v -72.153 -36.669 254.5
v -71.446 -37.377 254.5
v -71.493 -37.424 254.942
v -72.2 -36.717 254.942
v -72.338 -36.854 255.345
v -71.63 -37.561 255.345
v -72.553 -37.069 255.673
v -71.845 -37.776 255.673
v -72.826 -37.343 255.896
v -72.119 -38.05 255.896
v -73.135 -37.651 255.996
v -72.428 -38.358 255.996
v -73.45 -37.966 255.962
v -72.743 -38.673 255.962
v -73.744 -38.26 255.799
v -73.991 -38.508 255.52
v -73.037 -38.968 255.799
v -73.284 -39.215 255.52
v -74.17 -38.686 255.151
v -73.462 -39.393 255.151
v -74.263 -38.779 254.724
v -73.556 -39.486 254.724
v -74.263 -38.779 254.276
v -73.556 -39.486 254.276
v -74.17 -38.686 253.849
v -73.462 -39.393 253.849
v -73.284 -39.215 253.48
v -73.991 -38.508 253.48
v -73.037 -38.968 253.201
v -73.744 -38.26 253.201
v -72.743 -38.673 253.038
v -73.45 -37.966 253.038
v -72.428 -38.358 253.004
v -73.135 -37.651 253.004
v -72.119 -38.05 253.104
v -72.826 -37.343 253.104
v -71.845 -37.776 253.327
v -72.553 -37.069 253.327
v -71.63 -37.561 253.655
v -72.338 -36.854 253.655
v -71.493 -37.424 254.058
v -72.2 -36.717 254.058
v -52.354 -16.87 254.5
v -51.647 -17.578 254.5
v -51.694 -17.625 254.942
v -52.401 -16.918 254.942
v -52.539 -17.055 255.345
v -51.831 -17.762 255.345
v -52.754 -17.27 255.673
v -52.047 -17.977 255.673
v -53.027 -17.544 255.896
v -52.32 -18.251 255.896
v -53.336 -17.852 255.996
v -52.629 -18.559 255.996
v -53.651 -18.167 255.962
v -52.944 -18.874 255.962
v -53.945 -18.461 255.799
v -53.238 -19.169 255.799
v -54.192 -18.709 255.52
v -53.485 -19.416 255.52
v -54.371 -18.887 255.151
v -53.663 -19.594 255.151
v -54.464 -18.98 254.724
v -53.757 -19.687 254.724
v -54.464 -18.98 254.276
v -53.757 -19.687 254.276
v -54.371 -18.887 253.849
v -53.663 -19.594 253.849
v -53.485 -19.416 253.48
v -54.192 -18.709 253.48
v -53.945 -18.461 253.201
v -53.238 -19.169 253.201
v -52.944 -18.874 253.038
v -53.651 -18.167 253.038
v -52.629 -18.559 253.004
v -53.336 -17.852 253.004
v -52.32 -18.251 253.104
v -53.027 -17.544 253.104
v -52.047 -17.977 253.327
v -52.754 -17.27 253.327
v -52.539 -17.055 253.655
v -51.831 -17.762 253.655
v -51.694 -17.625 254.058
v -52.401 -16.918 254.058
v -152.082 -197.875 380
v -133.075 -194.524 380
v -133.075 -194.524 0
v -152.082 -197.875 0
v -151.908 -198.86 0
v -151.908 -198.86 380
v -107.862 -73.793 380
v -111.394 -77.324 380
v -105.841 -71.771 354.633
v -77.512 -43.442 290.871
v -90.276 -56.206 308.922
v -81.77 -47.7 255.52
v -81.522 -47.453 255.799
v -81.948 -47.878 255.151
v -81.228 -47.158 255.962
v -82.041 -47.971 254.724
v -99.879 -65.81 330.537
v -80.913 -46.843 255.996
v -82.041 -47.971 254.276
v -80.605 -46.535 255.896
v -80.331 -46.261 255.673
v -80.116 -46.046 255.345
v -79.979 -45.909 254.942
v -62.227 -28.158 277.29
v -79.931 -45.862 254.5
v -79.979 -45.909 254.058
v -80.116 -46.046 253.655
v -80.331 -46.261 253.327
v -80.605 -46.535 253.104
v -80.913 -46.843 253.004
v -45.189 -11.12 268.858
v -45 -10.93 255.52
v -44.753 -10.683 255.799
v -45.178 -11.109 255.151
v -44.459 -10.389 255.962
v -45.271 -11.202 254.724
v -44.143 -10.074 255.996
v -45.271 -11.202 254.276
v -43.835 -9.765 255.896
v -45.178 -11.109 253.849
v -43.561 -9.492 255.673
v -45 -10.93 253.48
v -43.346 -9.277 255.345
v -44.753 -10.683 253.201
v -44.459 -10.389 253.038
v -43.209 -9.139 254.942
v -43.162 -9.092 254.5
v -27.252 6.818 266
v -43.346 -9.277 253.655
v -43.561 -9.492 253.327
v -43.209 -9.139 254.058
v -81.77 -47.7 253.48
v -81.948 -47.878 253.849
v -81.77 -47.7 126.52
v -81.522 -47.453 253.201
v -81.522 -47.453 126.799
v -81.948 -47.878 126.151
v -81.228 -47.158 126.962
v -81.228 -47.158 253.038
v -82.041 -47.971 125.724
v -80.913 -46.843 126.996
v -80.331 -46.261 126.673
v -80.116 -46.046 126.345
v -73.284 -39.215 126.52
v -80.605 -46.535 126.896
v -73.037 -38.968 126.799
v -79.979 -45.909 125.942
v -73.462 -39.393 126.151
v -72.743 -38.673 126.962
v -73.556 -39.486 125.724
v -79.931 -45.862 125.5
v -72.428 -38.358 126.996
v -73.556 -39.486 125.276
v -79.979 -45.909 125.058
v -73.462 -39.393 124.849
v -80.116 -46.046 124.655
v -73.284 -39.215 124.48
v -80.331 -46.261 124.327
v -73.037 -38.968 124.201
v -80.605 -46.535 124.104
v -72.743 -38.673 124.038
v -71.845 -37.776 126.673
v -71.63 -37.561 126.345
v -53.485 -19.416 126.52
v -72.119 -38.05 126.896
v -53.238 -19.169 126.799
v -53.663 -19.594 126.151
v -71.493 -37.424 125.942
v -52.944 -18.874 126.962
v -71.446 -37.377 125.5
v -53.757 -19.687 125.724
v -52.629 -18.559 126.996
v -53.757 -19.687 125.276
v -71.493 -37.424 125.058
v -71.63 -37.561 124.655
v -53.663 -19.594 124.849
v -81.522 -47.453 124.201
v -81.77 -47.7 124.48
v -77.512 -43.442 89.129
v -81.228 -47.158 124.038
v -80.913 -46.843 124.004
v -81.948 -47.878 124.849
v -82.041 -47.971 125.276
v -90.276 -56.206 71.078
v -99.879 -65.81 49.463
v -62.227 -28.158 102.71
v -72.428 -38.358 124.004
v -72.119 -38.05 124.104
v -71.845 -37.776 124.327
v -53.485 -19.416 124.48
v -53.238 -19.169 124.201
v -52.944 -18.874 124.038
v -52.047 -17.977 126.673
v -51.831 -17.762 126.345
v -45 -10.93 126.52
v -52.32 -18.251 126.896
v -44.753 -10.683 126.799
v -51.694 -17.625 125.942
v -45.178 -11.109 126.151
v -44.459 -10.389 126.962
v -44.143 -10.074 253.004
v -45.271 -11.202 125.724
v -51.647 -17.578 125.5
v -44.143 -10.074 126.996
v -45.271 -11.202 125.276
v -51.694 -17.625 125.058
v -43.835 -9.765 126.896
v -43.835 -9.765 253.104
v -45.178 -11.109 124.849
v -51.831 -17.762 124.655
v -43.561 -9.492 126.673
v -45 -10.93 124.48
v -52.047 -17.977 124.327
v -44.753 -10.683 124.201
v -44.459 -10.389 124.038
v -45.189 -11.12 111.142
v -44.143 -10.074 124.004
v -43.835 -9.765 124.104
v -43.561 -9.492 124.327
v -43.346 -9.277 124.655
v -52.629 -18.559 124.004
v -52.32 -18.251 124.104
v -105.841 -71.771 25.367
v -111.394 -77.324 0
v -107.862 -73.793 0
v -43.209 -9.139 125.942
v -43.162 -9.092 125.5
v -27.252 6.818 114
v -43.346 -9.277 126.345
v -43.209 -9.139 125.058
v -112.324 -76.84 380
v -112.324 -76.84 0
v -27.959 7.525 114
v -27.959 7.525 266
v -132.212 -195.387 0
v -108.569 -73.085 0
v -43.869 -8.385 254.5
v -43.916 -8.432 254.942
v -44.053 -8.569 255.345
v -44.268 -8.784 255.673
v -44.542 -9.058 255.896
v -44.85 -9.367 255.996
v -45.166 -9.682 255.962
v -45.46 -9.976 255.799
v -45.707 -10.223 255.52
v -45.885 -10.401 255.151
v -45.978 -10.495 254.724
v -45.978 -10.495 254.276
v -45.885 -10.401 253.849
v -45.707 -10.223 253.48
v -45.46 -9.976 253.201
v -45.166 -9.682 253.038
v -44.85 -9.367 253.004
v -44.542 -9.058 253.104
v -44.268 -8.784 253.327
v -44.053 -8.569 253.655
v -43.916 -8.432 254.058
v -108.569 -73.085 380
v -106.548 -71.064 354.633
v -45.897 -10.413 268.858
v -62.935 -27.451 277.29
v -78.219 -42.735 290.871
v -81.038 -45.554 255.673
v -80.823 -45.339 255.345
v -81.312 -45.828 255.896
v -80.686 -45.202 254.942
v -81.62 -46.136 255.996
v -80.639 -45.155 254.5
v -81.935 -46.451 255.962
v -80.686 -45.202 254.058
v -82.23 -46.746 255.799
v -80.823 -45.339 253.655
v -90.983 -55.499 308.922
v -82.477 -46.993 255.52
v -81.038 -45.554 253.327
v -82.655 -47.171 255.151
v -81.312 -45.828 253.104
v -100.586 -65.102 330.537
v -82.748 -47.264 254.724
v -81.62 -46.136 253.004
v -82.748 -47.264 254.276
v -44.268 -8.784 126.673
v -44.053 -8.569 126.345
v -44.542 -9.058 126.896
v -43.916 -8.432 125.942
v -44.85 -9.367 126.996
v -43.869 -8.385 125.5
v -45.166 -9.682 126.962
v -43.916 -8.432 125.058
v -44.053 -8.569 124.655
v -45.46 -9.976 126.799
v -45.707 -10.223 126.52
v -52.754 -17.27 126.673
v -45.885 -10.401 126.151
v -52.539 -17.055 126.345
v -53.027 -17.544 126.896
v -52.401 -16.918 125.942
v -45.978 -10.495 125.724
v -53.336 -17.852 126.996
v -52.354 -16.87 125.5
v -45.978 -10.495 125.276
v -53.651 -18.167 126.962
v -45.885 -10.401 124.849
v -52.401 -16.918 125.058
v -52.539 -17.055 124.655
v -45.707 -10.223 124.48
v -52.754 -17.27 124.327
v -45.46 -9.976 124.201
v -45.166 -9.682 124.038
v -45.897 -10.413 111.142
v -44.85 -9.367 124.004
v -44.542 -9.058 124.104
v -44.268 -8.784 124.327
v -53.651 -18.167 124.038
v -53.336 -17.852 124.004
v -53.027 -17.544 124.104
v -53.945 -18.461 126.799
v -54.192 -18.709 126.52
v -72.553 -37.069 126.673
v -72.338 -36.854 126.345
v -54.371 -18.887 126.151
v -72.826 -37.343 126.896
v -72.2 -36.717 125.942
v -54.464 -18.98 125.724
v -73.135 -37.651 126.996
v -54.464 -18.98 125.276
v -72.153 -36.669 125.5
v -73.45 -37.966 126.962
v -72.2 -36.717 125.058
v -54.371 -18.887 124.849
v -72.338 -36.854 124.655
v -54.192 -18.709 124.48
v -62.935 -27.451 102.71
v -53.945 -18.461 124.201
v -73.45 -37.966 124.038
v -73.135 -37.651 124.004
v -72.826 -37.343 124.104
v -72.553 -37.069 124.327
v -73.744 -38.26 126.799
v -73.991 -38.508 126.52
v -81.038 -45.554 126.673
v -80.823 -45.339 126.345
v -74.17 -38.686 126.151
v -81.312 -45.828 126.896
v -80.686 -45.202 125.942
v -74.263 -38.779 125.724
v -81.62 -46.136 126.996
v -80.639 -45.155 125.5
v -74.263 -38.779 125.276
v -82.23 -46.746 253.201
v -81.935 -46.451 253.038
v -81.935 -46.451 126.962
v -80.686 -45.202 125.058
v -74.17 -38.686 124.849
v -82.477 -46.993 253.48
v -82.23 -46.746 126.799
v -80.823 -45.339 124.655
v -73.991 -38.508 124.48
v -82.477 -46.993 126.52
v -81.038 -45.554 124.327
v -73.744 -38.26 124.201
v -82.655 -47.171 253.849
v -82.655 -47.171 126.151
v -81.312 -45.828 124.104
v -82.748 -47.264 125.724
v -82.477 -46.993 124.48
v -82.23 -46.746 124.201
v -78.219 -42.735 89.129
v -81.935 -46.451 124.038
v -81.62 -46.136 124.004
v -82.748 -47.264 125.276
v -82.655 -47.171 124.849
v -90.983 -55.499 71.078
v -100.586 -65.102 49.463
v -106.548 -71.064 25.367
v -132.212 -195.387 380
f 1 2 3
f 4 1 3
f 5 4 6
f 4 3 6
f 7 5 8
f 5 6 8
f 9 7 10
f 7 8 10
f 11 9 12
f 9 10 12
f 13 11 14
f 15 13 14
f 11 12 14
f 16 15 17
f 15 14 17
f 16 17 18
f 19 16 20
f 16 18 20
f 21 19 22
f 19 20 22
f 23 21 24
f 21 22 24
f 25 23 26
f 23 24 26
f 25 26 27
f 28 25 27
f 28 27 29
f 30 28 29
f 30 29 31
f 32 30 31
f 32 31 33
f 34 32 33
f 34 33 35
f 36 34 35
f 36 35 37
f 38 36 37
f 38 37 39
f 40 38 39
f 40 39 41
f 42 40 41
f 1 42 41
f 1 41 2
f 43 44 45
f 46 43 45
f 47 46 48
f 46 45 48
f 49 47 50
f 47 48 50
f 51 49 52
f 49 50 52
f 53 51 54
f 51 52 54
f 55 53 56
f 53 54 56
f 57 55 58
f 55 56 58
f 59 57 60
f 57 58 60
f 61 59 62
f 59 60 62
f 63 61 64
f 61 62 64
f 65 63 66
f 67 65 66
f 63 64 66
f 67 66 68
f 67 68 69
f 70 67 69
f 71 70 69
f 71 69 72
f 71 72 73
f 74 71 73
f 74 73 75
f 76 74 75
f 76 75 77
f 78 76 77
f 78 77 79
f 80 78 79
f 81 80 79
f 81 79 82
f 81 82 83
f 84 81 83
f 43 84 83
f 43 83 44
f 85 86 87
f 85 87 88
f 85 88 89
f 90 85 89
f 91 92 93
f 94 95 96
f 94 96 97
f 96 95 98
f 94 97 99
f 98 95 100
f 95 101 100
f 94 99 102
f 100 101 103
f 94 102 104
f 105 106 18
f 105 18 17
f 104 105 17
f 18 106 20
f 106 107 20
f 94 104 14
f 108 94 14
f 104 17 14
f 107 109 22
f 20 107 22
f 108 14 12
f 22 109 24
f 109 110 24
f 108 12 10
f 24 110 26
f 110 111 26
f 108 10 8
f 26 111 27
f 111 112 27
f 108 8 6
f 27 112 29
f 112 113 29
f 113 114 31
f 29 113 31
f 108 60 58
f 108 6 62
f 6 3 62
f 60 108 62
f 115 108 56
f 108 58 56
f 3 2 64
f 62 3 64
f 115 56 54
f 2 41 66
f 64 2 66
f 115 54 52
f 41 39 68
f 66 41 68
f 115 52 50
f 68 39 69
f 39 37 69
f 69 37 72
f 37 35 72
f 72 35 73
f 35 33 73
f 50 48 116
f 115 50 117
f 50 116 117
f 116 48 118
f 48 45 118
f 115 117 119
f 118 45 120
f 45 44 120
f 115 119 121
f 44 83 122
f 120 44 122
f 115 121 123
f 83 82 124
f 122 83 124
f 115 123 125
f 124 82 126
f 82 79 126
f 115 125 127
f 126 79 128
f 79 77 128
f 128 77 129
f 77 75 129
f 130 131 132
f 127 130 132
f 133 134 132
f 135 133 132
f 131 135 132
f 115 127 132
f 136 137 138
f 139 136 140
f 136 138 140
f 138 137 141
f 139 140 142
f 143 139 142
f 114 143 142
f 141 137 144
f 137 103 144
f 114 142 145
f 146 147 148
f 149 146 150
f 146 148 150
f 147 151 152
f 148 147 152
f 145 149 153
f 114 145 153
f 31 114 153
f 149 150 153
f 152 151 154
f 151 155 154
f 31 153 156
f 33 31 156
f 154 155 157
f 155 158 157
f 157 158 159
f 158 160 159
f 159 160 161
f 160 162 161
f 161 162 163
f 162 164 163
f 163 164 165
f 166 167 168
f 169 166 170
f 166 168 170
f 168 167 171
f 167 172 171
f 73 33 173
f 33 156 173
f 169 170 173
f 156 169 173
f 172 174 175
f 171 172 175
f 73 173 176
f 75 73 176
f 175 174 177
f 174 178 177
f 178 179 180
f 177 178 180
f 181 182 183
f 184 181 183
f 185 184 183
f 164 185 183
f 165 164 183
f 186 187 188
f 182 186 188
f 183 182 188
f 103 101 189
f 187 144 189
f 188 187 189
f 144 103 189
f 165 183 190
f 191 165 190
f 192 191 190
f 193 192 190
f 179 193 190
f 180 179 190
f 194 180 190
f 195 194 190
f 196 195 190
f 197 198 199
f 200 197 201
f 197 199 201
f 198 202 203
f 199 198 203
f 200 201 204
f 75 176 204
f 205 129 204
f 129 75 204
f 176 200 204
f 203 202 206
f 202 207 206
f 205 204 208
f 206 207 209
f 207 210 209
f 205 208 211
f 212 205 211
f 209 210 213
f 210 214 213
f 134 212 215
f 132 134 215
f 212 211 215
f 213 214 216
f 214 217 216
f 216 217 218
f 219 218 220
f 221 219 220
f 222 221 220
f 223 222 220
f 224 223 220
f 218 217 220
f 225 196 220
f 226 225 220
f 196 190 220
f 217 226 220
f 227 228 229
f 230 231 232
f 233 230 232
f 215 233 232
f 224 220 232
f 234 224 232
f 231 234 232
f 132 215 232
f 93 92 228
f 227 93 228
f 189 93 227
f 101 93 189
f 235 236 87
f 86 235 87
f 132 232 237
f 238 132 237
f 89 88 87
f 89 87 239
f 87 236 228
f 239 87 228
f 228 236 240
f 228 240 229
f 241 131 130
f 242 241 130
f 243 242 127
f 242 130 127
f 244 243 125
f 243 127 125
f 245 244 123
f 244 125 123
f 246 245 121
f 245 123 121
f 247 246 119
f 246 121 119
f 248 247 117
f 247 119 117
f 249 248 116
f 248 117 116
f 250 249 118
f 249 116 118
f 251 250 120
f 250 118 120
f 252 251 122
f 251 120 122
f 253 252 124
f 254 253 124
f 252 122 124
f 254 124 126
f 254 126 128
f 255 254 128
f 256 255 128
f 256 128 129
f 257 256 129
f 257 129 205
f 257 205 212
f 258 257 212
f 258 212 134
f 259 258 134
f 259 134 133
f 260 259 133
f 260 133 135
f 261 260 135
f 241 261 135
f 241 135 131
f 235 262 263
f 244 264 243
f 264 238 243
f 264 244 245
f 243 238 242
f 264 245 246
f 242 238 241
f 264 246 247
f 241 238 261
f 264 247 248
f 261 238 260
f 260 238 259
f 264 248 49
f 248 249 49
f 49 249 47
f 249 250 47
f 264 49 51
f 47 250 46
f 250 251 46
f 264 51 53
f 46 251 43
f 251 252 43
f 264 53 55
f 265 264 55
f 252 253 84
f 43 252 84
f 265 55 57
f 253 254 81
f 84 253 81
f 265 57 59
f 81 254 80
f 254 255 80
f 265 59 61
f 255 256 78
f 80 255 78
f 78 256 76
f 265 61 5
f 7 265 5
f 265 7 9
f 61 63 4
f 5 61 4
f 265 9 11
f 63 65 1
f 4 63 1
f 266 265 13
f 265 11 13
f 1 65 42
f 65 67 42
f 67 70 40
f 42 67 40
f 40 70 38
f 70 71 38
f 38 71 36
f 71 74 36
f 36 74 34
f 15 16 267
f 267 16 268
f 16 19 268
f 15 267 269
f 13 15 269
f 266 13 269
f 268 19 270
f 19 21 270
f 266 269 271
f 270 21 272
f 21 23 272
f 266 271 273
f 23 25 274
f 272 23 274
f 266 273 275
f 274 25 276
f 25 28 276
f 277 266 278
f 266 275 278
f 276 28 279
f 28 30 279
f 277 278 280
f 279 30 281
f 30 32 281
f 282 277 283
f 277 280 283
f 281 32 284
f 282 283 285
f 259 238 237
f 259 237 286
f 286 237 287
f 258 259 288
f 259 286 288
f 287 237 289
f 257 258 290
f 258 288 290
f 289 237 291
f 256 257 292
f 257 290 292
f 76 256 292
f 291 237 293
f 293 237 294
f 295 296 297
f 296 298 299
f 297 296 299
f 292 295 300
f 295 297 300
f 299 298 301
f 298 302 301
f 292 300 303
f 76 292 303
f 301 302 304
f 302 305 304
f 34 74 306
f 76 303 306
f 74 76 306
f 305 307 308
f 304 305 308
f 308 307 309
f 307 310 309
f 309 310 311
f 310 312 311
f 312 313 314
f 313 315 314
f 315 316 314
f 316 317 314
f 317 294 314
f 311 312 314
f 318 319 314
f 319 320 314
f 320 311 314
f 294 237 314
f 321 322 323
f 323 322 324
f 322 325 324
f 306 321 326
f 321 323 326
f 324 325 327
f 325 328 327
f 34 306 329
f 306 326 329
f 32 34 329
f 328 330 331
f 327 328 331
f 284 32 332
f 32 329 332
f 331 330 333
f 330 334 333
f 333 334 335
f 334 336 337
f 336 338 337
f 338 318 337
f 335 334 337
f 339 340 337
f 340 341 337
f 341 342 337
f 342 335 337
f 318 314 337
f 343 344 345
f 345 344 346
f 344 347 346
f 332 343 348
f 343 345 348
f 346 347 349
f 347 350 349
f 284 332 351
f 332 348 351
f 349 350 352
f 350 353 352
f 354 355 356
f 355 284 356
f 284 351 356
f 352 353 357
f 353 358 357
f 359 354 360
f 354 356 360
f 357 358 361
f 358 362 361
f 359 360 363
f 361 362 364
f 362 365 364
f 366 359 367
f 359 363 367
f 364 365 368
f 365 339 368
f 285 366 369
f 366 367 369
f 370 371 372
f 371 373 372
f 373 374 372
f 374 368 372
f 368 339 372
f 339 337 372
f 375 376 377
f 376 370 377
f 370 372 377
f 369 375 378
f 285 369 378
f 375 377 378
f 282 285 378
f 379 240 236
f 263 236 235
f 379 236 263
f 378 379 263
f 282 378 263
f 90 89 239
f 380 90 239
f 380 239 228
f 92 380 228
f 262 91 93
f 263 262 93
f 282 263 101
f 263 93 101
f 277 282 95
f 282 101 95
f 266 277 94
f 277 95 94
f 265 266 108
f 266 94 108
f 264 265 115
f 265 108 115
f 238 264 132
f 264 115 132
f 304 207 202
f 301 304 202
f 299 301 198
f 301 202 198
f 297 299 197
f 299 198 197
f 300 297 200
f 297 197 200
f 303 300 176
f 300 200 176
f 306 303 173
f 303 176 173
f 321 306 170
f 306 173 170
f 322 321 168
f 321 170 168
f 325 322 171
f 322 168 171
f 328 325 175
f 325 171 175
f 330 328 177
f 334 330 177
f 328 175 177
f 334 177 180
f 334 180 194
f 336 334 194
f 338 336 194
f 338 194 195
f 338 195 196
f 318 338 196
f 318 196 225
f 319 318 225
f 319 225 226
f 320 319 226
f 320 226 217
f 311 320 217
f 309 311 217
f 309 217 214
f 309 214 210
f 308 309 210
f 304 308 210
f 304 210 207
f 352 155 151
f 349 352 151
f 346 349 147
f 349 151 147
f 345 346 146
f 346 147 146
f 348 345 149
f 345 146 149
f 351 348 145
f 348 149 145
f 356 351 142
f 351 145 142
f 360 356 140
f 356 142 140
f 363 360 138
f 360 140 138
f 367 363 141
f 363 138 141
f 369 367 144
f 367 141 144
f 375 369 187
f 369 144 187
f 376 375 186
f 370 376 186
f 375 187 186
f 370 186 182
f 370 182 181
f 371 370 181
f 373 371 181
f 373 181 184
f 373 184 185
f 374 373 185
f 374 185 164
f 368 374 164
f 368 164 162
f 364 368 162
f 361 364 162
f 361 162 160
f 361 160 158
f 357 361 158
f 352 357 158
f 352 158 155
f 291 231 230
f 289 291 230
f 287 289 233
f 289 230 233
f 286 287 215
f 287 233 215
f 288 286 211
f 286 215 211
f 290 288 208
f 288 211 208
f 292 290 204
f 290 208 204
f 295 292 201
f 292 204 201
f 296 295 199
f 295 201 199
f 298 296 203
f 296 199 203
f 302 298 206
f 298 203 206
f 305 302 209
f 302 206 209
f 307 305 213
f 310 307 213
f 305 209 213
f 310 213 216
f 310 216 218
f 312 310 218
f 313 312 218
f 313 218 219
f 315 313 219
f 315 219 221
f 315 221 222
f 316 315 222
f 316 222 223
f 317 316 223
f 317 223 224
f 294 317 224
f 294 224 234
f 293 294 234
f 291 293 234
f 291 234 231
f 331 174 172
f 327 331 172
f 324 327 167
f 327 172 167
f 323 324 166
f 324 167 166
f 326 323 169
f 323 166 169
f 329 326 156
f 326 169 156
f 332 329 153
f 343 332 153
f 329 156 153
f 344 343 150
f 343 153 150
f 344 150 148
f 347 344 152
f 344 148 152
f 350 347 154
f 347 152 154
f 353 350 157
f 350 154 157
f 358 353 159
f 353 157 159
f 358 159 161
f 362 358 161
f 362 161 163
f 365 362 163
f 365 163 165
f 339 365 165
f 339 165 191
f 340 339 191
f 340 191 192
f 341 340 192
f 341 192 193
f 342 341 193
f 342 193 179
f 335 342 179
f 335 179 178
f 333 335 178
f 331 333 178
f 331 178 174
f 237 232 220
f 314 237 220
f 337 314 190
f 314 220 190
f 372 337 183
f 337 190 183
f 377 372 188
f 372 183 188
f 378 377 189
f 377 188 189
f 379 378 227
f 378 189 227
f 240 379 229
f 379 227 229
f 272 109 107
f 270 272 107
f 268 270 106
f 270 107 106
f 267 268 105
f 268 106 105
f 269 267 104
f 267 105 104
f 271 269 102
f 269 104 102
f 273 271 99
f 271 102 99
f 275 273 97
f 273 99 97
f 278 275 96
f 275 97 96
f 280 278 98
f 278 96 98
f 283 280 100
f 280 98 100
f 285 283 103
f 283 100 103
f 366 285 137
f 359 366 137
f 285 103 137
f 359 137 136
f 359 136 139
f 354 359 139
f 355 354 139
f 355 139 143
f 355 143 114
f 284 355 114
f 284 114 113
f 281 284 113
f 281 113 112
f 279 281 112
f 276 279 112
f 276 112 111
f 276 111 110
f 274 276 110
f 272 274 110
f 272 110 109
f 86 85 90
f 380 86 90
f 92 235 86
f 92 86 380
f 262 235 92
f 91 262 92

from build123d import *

# Parameters (mm, degrees)
EXTRUDE_1_DEPTH     = 380
SKETCH_2_R          = 1.5
CUT_EXTRUDE_1_DEPTH = 3


with BuildPart() as part:
    # 草图1 → 凸台-拉伸1 (new body)
    with BuildSketch(Plane.XY):
        Polygon((-133.074926411, -194.523734135), (-152.081511659, -197.875107926), (-151.907863481, -198.859915679), (-132.211708421, -195.386952125), (-111.394108644, -77.324476981), (-27.25197302, 6.817658643), (-27.959079801, 7.524765424), (-112.324165337, -76.840320111), align=None)
    extrude(amount=EXTRUDE_1_DEPTH)

    # 草图2 → 切除-拉伸1 (cut)
    with BuildSketch(Plane(origin=(-17.034815832, 17.034815832, 0), x_dir=(0, 0, -1), z_dir=(0.7071067811865477, -0.7071067811865475, 0))):
        with Locations(Location((-254.5, -38.449242265, 0), (0, 0, 90))):
            Circle(SKETCH_2_R)
        with Locations(Location((-254.5, -50.449242265, 0), (0, 0, 90))):
            Circle(SKETCH_2_R)
        with BuildLine():
            ThreePointArc((-380, -128.449242265), (-299.389826945, -95.05941532), (-266, -14.449242265))
            Line((-266, -14.449242265), (-380, -14.449242265))
            Line((-380, -14.449242265), (-380, -128.449242265))
        make_face()
        with BuildLine():
            Line((-380, -14.449242265), (-266, -14.449242265))
            ThreePointArc((-266, -14.449242265), (-460.610173055, 66.16093079), (-380, -128.449242265))
            Line((-380, -128.449242265), (-380, -14.449242265))
        make_face()
        with BuildLine():
            ThreePointArc((114, -14.449242265), (0, 99.550757735), (-114, -14.449242265))
            Line((-114, -14.449242265), (0, -14.449242265))
            Line((0, -14.449242265), (0, -128.449242265))
            ThreePointArc((0, -128.449242265), (80.610173055, -95.05941532), (114, -14.449242265))
        make_face()
        with BuildLine():
            Line((0, -14.449242265), (-114, -14.449242265))
            ThreePointArc((-114, -14.449242265), (-80.610173055, -95.05941532), (0, -128.449242265))
            Line((0, -128.449242265), (0, -14.449242265))
        make_face()
        with Locations(Location((-125.5, -38.449242265, 0), (0, 0, 90))):
            Circle(SKETCH_2_R)
        with Locations(Location((-125.5, -50.449242265, 0), (0, 0, 90))):
            Circle(SKETCH_2_R)
        with Locations(Location((-125.5, -78.449242265, 0), (0, 0, 90))):
            Circle(SKETCH_2_R)
        with Locations(Location((-125.5, -90.449242265, 0), (0, 0, 90))):
            Circle(SKETCH_2_R)
        with Locations(Location((-254.5, -90.449242265, 0), (0, 0, 90))):
            Circle(SKETCH_2_R)
        with Locations(Location((-254.5, -78.449242265, 0), (0, 0, 90))):
            Circle(SKETCH_2_R)
    extrude(amount=-CUT_EXTRUDE_1_DEPTH, mode=Mode.SUBTRACT)


solid = part.part
